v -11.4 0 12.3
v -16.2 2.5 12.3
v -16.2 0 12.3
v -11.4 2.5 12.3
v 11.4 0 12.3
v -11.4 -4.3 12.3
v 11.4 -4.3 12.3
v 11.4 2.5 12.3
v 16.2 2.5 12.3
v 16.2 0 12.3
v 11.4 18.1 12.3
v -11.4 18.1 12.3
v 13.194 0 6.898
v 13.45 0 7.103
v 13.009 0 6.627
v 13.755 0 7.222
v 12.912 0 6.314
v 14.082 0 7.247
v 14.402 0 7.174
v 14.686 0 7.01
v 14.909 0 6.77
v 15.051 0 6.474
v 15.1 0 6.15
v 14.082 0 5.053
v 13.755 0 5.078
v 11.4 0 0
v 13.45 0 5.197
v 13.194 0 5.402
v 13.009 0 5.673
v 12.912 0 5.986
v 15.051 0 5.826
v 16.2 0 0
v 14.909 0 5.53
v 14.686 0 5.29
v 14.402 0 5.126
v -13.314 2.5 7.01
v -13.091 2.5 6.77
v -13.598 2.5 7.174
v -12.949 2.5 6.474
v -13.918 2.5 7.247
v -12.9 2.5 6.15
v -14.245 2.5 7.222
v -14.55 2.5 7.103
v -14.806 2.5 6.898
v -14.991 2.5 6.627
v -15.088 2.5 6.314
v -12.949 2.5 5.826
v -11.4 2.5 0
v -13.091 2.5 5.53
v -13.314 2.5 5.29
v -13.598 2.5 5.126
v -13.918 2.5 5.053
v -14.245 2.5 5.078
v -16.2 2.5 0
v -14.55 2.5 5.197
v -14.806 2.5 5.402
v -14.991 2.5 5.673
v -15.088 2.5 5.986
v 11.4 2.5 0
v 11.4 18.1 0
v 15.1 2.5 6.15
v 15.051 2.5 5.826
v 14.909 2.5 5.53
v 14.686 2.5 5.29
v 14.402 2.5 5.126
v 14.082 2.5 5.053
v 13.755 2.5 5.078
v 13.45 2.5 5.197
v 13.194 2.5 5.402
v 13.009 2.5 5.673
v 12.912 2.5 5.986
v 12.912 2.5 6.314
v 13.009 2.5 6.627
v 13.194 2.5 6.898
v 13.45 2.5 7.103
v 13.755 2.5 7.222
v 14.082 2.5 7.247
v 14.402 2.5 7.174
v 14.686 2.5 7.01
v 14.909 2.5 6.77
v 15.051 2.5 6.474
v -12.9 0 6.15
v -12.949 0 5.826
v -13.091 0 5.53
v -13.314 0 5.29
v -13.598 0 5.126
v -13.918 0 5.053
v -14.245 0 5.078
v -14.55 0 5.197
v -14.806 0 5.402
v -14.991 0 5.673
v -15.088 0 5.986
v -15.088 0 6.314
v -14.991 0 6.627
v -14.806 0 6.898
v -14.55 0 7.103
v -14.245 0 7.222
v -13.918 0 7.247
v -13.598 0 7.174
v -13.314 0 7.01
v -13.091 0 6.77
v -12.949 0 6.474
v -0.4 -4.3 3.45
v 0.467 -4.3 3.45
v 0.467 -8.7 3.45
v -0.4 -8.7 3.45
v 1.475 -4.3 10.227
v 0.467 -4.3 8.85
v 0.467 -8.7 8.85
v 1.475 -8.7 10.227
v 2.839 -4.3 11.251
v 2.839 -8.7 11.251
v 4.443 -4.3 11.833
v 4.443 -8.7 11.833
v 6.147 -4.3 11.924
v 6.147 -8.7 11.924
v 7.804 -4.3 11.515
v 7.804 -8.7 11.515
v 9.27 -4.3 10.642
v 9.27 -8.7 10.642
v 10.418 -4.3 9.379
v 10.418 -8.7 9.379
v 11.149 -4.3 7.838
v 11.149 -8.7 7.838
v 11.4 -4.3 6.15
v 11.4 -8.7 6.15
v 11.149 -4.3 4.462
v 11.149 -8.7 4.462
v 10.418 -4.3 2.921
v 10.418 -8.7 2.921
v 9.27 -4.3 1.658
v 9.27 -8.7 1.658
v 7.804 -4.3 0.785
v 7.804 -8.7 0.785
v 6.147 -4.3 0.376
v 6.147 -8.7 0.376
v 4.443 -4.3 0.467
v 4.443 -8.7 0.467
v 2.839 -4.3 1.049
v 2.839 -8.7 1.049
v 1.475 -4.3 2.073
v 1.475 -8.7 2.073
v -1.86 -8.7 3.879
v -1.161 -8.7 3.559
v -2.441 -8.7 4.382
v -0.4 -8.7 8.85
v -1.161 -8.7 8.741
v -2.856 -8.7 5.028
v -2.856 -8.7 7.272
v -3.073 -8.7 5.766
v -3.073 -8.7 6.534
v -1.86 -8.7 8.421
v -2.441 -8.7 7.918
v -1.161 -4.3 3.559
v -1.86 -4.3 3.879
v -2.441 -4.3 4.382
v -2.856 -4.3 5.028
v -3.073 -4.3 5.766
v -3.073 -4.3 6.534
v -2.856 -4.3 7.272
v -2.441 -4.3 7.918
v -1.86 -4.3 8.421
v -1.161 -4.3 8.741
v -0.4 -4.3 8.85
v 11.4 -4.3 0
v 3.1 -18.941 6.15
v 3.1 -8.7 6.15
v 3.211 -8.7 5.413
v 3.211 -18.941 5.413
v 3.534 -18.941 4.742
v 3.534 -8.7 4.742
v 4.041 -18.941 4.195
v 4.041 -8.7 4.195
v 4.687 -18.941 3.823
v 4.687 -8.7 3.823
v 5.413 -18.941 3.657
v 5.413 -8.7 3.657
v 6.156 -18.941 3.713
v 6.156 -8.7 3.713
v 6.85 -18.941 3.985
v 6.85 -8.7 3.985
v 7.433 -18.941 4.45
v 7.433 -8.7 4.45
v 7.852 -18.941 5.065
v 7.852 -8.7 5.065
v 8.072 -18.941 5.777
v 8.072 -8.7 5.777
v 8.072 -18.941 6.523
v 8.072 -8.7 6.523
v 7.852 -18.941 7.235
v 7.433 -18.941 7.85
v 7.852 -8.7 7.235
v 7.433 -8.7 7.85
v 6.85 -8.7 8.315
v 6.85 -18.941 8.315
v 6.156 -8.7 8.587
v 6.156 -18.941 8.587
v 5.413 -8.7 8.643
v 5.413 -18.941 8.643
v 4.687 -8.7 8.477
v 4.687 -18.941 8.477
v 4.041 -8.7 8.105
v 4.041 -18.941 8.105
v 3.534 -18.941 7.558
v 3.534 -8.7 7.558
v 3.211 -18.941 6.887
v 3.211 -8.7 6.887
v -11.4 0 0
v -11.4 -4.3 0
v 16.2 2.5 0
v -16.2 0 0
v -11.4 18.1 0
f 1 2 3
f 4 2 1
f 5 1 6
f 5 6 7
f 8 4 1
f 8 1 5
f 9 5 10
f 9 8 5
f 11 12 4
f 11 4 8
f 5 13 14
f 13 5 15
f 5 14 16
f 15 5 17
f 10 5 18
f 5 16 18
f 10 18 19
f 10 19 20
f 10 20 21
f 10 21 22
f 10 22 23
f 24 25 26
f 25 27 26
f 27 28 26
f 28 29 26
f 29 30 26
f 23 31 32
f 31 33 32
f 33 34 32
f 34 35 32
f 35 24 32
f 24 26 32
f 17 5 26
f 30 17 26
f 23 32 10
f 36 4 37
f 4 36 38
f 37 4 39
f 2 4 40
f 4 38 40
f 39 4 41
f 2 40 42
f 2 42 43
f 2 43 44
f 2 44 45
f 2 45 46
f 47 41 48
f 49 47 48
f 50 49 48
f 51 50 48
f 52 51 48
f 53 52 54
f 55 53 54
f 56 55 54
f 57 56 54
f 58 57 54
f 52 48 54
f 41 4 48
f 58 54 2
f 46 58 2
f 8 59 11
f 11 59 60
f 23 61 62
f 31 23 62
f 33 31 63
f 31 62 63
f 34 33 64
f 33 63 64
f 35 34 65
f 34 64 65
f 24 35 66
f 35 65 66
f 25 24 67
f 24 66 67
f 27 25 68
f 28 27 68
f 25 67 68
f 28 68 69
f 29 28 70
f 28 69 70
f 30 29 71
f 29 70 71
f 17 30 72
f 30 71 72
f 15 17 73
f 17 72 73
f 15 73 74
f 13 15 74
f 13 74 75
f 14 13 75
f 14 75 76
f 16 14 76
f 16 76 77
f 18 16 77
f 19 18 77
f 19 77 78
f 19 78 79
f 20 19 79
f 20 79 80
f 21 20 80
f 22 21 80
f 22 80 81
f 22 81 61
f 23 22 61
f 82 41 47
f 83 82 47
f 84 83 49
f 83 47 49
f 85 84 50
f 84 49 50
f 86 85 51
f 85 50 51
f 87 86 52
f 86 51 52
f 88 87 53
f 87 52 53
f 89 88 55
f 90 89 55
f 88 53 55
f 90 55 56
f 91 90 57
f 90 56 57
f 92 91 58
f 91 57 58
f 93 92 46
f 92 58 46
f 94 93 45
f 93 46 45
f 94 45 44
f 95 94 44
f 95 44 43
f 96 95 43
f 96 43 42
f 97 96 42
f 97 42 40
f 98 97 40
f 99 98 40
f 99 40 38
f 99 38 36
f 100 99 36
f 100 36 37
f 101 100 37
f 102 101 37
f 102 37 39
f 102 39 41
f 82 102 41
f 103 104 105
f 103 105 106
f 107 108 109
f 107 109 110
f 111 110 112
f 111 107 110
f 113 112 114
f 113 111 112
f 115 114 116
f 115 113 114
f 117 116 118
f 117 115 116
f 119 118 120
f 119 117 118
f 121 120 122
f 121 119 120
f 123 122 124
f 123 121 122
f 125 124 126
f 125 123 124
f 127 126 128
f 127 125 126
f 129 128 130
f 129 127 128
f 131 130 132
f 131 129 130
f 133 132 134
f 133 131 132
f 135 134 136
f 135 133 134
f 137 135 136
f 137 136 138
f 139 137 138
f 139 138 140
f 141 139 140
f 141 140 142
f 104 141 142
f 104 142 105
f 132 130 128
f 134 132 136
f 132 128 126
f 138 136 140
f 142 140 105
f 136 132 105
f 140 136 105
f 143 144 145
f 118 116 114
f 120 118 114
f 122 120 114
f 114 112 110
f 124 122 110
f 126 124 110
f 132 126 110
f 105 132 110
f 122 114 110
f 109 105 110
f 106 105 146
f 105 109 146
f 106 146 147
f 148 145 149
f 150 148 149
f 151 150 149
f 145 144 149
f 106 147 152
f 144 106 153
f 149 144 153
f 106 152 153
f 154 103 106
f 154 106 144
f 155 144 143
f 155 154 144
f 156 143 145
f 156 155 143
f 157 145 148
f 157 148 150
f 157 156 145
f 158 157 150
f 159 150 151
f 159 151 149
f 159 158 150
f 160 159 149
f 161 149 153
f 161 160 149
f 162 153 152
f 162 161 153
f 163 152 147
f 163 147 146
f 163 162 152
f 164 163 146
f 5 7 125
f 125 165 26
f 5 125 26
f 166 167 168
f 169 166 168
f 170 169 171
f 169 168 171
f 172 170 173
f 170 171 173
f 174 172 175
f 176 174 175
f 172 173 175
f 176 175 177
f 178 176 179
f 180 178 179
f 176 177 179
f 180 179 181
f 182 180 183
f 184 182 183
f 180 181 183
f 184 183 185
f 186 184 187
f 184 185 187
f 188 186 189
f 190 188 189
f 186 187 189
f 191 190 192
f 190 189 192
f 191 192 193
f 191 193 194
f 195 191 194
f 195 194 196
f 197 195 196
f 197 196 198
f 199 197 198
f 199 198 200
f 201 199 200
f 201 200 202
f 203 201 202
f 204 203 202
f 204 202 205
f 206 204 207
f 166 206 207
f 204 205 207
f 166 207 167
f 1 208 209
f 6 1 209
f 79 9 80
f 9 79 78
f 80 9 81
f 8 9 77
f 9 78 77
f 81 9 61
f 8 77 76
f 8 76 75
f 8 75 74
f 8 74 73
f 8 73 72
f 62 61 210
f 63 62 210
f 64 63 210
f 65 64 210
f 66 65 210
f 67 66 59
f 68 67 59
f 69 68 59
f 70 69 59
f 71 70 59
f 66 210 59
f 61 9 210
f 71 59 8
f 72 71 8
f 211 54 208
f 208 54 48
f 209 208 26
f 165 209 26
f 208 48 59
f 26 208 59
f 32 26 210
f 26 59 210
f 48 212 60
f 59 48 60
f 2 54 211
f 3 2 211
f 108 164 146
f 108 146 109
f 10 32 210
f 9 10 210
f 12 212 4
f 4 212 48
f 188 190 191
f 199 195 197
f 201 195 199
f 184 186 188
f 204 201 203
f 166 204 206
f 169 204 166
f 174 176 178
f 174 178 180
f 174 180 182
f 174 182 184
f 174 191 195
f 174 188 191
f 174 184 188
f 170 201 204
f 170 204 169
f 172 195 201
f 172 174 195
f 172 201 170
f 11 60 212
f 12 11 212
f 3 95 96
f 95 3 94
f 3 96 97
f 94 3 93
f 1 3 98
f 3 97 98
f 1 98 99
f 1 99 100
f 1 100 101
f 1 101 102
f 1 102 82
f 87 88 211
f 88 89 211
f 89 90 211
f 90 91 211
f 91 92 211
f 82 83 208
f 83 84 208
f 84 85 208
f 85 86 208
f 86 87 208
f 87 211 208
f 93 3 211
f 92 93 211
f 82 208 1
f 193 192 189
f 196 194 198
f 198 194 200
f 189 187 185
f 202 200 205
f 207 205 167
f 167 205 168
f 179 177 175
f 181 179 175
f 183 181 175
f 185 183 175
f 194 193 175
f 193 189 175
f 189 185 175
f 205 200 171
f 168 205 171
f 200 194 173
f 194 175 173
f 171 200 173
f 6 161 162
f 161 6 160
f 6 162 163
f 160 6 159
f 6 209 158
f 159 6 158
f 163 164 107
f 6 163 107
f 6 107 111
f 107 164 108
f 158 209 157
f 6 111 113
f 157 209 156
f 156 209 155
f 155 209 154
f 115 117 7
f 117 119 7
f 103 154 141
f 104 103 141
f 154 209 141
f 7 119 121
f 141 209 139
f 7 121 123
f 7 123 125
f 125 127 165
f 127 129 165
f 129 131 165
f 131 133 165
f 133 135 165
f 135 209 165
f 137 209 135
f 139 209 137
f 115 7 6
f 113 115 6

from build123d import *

# Parameters (mm, degrees)
BOSS_EXTRUDE1_DEPTH = 12.3
BOSS_EXTRUDE2_DEPTH = 4.4
SKETCH3_R           = 1.1
CUT_EXTRUDE1_DEPTH  = 8
SKETCH_1_R          = 2.5
EXTRUDE_1_DEPTH     = 10.240649244


with BuildPart() as part:
    # Sketch1 → Boss-Extrude1 (new body)
    with BuildSketch(Plane.XY):
        Polygon((-16.2, 0), (-11.4, 0), (-11.4, -4.3), (11.4, -4.3), (11.4, 0), (16.2, 0), (16.2, 2.5), (11.4, 2.5), (11.4, 18.1), (-11.4, 18.1), (-11.4, 2.5), (-16.2, 2.5), align=None)
    extrude(amount=BOSS_EXTRUDE1_DEPTH)

    # Sketch2 → Boss-Extrude2 (add)
    with BuildSketch(Plane.XZ.offset(4.3)):
        with BuildLine():
            Line((-0.4, 8.85), (0.466774893, 8.85))
            ThreePointArc((0.466774893, 8.85), (11.4, 6.15), (0.466774893, 3.45))
            Line((0.466774893, 3.45), (-0.4, 3.45))
            ThreePointArc((-0.4, 3.45), (-3.1, 6.15), (-0.4, 8.85))
        make_face()
    extrude(amount=BOSS_EXTRUDE2_DEPTH)

    # Sketch3 → Cut-Extrude1 (cut)
    with BuildSketch(Plane(origin=(0, 2.5, 0), x_dir=(1, 0, 0), z_dir=(0, 1, 0))):
        with Locations((-14, -6.15)):
            Circle(SKETCH3_R)
        with Locations((14, -6.15)):
            Circle(SKETCH3_R)
    extrude(amount=-CUT_EXTRUDE1_DEPTH, mode=Mode.SUBTRACT)


with BuildPart() as body_2:
    # 草圖1 → 填料-伸長1 (new body)
    with BuildSketch(Plane(origin=(0, -8.7, 0), x_dir=(-1, 0, 0), z_dir=(0, -1, 0))):
        with Locations((-5.6, -6.15)):
            Circle(SKETCH_1_R)
    extrude(amount=EXTRUDE_1_DEPTH)


solid = Compound([part.part, body_2.part])
